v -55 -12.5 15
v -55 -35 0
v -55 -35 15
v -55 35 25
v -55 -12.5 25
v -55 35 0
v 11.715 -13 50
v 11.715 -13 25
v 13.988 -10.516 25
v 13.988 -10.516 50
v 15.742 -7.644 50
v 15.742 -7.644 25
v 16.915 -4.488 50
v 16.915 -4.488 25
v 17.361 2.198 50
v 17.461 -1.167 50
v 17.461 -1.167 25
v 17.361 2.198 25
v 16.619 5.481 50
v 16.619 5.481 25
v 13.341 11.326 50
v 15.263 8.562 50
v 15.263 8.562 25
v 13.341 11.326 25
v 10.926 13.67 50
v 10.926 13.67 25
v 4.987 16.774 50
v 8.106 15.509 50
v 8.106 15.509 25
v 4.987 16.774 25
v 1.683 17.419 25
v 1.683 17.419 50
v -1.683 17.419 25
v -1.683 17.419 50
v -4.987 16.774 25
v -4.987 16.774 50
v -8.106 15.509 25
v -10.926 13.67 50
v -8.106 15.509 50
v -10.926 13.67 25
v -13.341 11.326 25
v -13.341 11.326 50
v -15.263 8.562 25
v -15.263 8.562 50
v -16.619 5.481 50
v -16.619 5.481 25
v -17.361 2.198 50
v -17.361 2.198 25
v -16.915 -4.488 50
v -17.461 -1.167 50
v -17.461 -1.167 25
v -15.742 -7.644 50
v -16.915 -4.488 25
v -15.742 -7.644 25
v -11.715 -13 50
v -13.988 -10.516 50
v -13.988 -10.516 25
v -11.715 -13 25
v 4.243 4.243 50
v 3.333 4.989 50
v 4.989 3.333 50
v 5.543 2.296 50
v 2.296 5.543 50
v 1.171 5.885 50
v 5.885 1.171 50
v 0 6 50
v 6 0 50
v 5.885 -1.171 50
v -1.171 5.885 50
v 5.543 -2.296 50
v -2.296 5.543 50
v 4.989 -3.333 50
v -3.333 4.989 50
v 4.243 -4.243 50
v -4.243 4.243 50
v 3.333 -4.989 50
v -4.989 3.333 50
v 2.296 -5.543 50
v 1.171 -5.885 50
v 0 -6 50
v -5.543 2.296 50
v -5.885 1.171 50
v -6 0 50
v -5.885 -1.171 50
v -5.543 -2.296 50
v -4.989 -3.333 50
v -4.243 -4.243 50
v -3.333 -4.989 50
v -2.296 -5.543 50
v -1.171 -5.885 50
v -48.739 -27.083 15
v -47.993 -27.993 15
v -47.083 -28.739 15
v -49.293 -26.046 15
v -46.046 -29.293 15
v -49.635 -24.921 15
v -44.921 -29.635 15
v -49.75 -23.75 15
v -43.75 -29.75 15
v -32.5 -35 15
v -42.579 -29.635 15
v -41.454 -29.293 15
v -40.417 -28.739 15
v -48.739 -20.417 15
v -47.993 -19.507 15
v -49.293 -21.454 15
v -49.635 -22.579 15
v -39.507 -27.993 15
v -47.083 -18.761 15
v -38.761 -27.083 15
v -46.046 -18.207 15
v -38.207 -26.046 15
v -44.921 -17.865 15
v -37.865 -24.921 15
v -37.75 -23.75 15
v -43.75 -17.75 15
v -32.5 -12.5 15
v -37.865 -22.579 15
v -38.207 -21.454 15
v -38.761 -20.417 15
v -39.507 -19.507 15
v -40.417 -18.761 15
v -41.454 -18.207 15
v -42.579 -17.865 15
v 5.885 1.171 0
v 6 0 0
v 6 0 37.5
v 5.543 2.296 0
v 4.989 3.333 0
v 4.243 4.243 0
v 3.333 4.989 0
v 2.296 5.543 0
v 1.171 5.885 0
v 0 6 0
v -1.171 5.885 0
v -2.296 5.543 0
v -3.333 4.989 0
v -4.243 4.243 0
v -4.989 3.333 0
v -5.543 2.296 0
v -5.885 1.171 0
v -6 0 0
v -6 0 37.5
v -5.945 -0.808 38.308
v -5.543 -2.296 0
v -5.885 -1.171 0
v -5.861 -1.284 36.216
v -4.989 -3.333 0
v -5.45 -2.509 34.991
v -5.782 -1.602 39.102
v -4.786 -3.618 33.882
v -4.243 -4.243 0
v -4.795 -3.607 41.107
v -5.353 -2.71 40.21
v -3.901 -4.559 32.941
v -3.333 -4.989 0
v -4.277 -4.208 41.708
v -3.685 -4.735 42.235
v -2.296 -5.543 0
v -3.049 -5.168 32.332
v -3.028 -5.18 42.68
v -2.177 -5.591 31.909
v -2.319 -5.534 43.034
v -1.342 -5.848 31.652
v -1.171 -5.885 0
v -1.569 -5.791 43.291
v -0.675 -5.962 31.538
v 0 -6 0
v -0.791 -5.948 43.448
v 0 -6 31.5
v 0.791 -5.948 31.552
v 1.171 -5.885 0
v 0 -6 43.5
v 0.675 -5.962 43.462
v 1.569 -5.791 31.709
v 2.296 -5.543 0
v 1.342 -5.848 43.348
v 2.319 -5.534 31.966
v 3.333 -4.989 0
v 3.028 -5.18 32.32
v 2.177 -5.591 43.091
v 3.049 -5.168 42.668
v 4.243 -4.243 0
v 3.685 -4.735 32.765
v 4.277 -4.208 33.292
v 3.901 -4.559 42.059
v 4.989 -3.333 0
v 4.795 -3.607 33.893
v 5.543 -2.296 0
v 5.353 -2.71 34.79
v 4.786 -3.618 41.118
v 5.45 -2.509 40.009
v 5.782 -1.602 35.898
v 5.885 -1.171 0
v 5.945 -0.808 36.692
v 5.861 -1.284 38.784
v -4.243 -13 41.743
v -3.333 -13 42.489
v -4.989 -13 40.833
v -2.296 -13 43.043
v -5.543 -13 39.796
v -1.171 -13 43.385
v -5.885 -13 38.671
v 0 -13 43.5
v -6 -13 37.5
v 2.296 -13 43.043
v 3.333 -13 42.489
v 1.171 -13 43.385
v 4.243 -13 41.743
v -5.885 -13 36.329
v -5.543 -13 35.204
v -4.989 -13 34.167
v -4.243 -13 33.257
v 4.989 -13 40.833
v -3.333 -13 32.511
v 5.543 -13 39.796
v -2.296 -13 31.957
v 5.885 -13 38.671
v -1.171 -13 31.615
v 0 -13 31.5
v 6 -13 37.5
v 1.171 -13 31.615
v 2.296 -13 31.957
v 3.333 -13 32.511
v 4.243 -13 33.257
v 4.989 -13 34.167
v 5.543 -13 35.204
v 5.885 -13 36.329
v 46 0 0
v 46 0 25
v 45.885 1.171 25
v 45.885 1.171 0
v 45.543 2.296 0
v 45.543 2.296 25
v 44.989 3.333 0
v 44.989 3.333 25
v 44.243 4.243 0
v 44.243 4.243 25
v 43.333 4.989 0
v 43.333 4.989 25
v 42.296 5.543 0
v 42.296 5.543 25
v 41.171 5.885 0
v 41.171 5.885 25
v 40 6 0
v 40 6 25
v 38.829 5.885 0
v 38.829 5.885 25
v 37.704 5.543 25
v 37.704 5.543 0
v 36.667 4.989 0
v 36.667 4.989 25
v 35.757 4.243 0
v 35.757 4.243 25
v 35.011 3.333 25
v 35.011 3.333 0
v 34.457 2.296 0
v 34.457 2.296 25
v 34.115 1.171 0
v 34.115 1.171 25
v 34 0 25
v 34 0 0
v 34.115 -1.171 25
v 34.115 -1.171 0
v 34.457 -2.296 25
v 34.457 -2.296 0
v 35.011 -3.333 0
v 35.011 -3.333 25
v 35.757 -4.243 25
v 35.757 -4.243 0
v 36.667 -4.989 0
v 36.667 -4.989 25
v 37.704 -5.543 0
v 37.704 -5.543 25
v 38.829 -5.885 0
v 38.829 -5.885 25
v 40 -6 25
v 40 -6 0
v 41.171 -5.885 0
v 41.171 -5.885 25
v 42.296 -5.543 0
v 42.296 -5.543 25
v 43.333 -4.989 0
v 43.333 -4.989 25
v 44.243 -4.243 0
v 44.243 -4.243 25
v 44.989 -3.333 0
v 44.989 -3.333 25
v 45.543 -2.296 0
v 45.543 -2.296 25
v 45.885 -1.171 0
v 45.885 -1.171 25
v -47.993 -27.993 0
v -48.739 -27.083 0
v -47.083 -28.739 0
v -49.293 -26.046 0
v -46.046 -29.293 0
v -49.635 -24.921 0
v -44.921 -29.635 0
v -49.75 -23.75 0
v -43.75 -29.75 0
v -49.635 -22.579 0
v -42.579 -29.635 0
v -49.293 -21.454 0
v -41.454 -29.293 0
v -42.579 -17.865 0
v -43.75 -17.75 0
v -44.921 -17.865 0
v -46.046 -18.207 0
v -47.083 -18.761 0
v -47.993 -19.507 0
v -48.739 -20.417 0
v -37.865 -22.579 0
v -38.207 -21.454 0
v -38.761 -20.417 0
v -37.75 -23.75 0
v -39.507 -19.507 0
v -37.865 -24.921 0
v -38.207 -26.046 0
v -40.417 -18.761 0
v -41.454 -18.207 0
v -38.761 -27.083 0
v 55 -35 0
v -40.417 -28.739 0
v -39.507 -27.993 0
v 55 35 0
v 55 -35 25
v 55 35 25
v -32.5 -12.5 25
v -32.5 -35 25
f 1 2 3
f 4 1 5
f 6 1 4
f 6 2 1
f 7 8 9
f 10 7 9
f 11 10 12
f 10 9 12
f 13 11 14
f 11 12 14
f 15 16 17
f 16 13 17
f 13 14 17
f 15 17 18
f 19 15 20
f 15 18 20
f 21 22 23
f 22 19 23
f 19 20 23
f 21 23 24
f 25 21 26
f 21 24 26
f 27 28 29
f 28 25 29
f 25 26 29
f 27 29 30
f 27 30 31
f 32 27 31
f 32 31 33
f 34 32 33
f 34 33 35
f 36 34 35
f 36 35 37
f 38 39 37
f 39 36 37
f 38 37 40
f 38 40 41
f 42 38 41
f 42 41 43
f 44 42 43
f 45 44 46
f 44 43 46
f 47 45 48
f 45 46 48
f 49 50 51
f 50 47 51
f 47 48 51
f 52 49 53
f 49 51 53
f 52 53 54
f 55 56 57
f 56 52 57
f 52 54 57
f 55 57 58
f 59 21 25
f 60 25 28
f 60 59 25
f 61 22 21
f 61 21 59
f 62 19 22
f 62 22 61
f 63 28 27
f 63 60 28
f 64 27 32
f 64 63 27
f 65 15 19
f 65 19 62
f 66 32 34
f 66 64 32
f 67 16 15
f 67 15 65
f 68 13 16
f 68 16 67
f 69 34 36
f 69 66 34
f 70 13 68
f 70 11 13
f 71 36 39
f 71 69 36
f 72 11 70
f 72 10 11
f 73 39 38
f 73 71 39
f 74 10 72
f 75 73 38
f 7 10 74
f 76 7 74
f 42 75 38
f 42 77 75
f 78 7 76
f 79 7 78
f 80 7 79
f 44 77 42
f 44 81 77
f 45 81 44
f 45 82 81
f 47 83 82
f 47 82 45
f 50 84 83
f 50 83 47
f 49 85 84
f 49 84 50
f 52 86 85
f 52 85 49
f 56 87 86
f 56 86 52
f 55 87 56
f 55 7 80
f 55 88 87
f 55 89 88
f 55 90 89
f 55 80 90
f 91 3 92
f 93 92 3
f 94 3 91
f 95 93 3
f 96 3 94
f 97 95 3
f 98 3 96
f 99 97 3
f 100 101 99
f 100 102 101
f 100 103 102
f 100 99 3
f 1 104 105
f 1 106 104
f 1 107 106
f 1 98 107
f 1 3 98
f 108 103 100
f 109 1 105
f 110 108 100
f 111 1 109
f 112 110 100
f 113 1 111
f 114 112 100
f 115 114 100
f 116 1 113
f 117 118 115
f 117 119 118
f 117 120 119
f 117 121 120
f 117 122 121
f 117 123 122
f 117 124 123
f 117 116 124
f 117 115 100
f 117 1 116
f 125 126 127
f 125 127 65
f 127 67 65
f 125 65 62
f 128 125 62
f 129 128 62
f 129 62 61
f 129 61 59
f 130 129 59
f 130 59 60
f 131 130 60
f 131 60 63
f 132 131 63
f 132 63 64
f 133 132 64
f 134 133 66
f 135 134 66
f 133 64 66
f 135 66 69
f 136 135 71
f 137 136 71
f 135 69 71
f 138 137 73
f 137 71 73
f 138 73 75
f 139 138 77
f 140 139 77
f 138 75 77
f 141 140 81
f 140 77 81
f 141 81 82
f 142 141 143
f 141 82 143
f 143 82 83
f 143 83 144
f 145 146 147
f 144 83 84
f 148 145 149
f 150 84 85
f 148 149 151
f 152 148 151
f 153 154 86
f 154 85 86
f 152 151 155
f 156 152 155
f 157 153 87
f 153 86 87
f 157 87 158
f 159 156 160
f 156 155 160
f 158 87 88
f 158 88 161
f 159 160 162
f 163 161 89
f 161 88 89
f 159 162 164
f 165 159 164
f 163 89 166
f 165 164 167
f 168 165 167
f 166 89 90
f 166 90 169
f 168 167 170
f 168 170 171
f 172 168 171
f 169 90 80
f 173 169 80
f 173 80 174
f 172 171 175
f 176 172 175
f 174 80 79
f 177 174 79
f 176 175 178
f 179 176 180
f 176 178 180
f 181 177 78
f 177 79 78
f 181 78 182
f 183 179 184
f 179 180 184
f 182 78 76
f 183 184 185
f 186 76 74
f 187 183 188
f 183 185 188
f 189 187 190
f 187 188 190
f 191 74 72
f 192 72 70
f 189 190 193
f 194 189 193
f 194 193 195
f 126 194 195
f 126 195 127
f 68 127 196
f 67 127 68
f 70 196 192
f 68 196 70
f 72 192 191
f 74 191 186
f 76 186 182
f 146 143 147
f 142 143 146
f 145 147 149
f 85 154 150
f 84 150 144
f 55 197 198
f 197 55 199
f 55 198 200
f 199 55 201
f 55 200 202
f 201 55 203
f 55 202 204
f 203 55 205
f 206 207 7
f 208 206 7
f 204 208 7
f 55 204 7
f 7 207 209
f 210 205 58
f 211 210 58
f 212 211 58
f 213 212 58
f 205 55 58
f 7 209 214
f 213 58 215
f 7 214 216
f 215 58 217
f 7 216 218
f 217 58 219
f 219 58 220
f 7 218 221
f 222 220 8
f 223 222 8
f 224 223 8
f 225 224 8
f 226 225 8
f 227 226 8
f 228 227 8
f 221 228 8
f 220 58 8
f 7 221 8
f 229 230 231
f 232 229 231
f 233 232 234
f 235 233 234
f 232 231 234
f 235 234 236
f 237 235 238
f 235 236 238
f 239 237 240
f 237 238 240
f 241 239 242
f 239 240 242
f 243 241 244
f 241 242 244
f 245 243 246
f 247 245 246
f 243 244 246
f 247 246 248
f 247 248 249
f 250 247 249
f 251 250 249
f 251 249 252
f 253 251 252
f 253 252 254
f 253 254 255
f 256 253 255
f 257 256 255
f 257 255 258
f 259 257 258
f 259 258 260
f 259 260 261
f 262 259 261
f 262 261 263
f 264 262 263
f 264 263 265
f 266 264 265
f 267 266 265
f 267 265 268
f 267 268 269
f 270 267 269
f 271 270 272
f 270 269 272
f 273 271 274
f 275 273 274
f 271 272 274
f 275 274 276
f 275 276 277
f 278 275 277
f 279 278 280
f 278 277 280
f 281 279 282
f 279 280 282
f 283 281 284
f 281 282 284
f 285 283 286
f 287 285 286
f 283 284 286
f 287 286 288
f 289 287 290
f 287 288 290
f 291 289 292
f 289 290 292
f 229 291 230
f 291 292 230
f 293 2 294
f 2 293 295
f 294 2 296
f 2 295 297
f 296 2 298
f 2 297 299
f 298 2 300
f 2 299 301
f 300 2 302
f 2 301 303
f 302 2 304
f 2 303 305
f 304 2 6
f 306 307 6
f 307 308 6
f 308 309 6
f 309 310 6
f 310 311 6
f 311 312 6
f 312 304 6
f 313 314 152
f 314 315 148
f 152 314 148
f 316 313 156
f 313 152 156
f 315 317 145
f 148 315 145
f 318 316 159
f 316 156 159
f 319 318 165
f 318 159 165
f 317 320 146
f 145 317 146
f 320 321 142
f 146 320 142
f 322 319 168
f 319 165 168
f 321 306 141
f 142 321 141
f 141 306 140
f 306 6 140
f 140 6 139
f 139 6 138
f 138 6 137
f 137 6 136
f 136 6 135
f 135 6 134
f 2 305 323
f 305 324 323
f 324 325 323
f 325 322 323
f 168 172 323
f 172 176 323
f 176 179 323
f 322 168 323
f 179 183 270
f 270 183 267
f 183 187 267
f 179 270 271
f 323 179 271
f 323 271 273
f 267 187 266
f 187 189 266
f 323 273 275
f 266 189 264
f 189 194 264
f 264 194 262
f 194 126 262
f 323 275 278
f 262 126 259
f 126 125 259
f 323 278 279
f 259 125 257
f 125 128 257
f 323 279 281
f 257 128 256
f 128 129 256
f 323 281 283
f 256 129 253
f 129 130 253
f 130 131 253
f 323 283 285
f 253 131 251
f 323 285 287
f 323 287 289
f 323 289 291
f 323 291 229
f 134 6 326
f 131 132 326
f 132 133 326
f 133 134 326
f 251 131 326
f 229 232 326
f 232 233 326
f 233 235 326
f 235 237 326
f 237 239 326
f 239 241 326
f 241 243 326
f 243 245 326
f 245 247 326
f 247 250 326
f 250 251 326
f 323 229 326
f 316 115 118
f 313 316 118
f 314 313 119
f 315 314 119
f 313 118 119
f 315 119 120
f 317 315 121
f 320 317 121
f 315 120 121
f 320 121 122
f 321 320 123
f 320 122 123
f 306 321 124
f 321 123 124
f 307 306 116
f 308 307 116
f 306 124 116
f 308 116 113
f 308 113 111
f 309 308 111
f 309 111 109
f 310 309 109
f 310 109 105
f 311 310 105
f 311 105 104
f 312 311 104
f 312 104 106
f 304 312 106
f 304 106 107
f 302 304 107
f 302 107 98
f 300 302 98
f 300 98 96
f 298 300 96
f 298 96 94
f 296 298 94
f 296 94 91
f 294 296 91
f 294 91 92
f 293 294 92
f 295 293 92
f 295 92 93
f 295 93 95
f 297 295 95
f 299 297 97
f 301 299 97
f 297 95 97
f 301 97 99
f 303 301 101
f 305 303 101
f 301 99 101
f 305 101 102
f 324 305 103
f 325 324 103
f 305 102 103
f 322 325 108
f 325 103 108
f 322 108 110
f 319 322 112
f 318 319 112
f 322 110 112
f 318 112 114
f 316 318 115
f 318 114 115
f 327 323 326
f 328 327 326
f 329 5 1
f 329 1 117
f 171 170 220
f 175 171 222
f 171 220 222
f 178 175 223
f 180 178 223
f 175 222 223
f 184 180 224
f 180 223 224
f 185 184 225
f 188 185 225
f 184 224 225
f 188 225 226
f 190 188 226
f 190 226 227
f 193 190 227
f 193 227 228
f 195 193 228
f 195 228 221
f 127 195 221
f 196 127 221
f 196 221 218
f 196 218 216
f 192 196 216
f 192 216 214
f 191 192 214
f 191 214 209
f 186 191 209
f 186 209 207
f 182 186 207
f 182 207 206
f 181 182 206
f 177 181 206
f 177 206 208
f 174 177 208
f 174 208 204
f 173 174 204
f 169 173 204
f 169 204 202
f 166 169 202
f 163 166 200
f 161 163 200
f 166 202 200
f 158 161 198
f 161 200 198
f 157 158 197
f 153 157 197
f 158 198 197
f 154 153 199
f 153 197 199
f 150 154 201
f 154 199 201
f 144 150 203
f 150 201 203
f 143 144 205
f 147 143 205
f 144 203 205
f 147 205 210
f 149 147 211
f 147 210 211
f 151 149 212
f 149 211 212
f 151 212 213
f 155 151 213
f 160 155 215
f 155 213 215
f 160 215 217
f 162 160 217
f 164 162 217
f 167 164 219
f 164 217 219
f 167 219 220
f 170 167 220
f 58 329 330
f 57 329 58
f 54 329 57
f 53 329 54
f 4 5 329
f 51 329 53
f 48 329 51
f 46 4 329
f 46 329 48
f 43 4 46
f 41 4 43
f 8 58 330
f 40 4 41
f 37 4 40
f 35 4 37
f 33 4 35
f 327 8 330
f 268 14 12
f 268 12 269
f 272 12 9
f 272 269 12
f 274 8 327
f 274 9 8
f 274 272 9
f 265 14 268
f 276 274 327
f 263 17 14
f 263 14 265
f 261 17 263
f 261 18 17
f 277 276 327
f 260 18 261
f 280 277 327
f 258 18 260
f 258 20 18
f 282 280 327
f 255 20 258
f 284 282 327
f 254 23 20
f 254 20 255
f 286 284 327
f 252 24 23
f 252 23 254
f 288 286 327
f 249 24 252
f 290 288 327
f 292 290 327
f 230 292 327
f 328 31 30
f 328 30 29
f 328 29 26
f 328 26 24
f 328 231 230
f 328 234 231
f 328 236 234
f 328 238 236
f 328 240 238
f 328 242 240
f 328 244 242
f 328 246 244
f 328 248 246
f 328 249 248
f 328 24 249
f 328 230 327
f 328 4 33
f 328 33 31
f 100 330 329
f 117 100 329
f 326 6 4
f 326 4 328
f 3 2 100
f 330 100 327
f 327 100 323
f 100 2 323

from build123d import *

# Parameters (mm, degrees)
SKETCH_1_W               = 110
SKETCH_1_H               = 70
EXTRUDE_1_DEPTH          = 25
SKETCH_2_R               = 17.5
EXTRUDE_2_DEPTH          = 25
SKETCH_3_R               = 6
CUT_EXTRUDE_1_DEPTH      = 83.158383626
SKETCH_5_W               = 45
SKETCH_5_H               = 45
CUT_EXTRUDE_3_DEPTH      = 10
SKETCH_6_R               = 6
CUT_EXTRUDE_4_DEPTH      = 74.993242935
SKETCH_7_R               = 6
CUT_EXTRUDE_5_DEPTH      = 70.821200219
CUT_EXTRUDE_START        = -25
CUT_EXTRUDE_6_DEPTH      = 25
CUT_EXTRUDE_7_REACH      = 90.482
CUT_EXTRUDE_7_END_RADIUS = 6
SKETCH_9_R               = 6


with BuildPart() as part:
    # Эскиз1 → Бобышка-Вытянуть1 (new body)
    with BuildSketch(Plane.XY):
        Rectangle(SKETCH_1_W, SKETCH_1_H)
    extrude(amount=EXTRUDE_1_DEPTH)

    # Эскиз2 → Бобышка-Вытянуть2 (add)
    with BuildSketch(Plane.XY.offset(25)):
        with Locations(Location((0, 0, 0), (0, 0, 180))):
            Circle(SKETCH_2_R)
    extrude(amount=EXTRUDE_2_DEPTH)

    # Эскиз3 → Вырез-Вытянуть1 (cut, through all)
    with BuildSketch(Plane.XY.offset(50)):
        Circle(SKETCH_3_R)
    extrude(amount=-CUT_EXTRUDE_1_DEPTH, mode=Mode.SUBTRACT)

    # Эскиз5 → Вырез-Вытянуть3 (cut)
    with BuildSketch(Plane.XY.offset(25)):
        with Locations((-55, -35)):
            Rectangle(SKETCH_5_W, SKETCH_5_H)
    extrude(amount=-CUT_EXTRUDE_3_DEPTH, mode=Mode.SUBTRACT)

    # Эскиз6 → Вырез-Вытянуть4 (cut, through all)
    with BuildSketch(Plane.XY.offset(15)):
        with Locations((-43.75, -23.75)):
            Circle(SKETCH_6_R)
    extrude(amount=-CUT_EXTRUDE_4_DEPTH, mode=Mode.SUBTRACT)

    # Эскиз7 → Вырез-Вытянуть5 (cut, through all)
    with BuildSketch(Plane.XY.offset(25)):
        with Locations((40, 0)):
            Circle(SKETCH_7_R)
    extrude(amount=-CUT_EXTRUDE_5_DEPTH, mode=Mode.SUBTRACT)

    # Эскиз8 → Вырез-Вытянуть6 (cut)
    with BuildSketch(Plane.XY.offset(50).offset(CUT_EXTRUDE_START)):
        with BuildLine():
            Line((-11.715374514, -13), (11.715374514, -13))
            ThreePointArc((11.715374514, -13), (0, -17.5), (-11.715374514, -13))
        make_face()
    extrude(amount=CUT_EXTRUDE_6_DEPTH, mode=Mode.SUBTRACT)

    # Вырез-Вытянуть7: up to this cylinder (the profile starts outside it)
    cut_extrude_7_end = Plane(origin=(0, 0, 37.5), z_dir=(0, 0, 1)) * Cylinder(CUT_EXTRUDE_7_END_RADIUS, 193.964, mode=Mode.PRIVATE)
    # Эскиз9 → Вырез-Вытянуть7 (cut, up to the surface)
    with BuildSketch(Plane.XZ.offset(13), mode=Mode.PRIVATE) as cut_extrude_7_sk1:
        with Locations(Location((0, 37.5, 0), (0, 0, 270))):
            Circle(SKETCH_9_R)
    cut_extrude_7_tool1 = extrude(cut_extrude_7_sk1.sketch, amount=-CUT_EXTRUDE_7_REACH, mode=Mode.PRIVATE) - cut_extrude_7_end
    add(cut_extrude_7_tool1.solids().sort_by_distance((0, -13, 37.5))[0], mode=Mode.SUBTRACT)


solid = part.part
